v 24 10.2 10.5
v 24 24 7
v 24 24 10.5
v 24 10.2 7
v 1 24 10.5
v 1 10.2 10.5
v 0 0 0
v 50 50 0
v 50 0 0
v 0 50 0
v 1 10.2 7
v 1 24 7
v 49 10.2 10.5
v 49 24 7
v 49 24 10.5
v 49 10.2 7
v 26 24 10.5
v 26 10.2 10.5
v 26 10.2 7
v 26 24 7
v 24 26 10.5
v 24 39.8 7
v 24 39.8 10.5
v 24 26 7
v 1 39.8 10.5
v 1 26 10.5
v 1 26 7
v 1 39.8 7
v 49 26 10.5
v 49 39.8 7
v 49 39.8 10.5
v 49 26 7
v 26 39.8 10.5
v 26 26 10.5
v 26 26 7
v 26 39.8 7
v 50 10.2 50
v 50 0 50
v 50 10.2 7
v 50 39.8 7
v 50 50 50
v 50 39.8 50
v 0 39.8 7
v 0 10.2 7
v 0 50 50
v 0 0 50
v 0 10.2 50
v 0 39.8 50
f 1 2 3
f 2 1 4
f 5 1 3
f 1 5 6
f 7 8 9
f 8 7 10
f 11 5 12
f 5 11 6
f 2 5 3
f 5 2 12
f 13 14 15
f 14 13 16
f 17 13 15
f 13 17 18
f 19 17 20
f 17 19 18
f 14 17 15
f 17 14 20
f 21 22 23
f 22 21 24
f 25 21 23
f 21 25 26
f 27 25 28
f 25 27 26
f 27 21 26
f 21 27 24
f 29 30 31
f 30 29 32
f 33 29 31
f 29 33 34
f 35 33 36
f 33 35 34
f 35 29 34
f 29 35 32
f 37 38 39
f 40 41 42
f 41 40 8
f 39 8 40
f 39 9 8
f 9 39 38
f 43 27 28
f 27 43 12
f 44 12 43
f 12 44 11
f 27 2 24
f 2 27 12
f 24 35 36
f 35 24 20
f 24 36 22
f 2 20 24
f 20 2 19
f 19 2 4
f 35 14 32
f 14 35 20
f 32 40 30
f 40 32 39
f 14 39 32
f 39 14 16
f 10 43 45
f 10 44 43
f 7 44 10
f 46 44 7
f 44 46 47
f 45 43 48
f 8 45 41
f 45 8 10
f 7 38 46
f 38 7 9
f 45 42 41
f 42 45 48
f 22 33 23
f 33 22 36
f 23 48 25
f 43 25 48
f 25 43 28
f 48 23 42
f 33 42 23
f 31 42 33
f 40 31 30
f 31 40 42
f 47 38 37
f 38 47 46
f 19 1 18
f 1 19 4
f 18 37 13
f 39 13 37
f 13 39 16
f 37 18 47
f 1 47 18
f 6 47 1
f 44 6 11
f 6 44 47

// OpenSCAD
color("LightGray") {
    translate([1,1,0]) cube([23,23,6+4.5]);
    translate([25+1,1,0]) cube([23,23,6+4.5]);
    translate([1,25+1,0]) cube([23,23,6+4.5]);
    translate([25+1,25+1,0]) cube([23,23,6+4.5]);
}
color("Grey") {
    cube([50,50,7]);
    translate([0,50-10.2,0]) cube([50,10.2,50]);
    translate([0,0,0]) cube([50,10.2,50]);
}
